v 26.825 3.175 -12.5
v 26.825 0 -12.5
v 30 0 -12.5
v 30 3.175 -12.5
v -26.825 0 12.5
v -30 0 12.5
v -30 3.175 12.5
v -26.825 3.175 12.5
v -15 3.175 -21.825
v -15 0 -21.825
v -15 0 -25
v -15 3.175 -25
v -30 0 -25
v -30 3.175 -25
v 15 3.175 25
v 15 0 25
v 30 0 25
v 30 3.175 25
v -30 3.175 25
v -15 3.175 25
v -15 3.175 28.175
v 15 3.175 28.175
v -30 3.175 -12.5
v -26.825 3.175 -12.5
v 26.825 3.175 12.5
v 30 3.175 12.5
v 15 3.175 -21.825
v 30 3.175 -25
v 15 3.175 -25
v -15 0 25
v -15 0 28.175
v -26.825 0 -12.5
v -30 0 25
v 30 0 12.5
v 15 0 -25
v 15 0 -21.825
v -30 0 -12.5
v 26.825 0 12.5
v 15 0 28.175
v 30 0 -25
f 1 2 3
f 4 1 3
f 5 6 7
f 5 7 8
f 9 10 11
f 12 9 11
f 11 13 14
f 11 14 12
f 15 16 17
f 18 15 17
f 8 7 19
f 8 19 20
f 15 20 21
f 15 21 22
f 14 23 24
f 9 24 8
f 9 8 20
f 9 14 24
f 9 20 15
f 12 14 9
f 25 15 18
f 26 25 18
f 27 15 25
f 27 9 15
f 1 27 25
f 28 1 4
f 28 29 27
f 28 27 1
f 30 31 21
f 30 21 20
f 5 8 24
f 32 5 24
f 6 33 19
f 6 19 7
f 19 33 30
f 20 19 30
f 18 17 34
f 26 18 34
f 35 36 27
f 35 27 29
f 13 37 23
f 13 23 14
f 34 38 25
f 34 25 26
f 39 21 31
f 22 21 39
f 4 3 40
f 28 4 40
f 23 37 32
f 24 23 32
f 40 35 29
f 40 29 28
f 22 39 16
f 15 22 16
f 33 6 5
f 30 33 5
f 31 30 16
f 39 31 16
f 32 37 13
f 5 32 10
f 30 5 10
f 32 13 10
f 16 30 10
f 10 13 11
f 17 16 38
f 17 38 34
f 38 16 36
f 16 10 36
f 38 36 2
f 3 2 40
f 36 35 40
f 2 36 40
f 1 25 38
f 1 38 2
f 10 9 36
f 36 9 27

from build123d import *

# Parameters (mm, degrees)
SKETCH1_W           = 60
SKETCH1_H           = 50
BOSS_EXTRUDE1_DEPTH = 3.175
SKETCH2_W           = 30
SKETCH2_H           = 3.175
CUT_EXTRUDE1_DEPTH  = 40.180104964
SKETCH3_W           = 30
SKETCH3_H           = 3.175
BOSS_EXTRUDE2_DEPTH = 3.175
SKETCH5_W           = 3.175
SKETCH5_H           = 25
CUT_EXTRUDE2_DEPTH  = 3.175


with BuildPart() as part:
    # Sketch1 → Boss-Extrude1 (new body)
    with BuildSketch(Plane(origin=(0, 0, 0), x_dir=(1, 0, 0), z_dir=(0, 1, 0))):
        Rectangle(SKETCH1_W, SKETCH1_H)
    extrude(amount=BOSS_EXTRUDE1_DEPTH)

    # Sketch2 → Cut-Extrude1 (cut, through all)
    with BuildSketch(Plane(origin=(0, 3.175, 0), x_dir=(1, 0, 0), z_dir=(0, 1, 0))):
        with Locations((0, 23.4125)):
            Rectangle(SKETCH2_W, SKETCH2_H)
    extrude(amount=-CUT_EXTRUDE1_DEPTH, mode=Mode.SUBTRACT)

    # Sketch3 → Boss-Extrude2 (add)
    with BuildSketch(Plane(origin=(0, 3.175, 0), x_dir=(1, 0, 0), z_dir=(0, 1, 0))):
        with Locations((0, -26.5875)):
            Rectangle(SKETCH3_W, SKETCH3_H)
    extrude(amount=-BOSS_EXTRUDE2_DEPTH)

    # Sketch5 → Cut-Extrude2 (cut)
    with BuildSketch(Plane(origin=(0, 3.175, 0), x_dir=(1, 0, 0), z_dir=(0, 1, 0))):
        with Locations((-28.4125, 0)):
            Rectangle(SKETCH5_W, SKETCH5_H)
        with Locations((28.4125, 0)):
            Rectangle(SKETCH5_W, SKETCH5_H)
    extrude(amount=-CUT_EXTRUDE2_DEPTH, mode=Mode.SUBTRACT)


solid = part.part
